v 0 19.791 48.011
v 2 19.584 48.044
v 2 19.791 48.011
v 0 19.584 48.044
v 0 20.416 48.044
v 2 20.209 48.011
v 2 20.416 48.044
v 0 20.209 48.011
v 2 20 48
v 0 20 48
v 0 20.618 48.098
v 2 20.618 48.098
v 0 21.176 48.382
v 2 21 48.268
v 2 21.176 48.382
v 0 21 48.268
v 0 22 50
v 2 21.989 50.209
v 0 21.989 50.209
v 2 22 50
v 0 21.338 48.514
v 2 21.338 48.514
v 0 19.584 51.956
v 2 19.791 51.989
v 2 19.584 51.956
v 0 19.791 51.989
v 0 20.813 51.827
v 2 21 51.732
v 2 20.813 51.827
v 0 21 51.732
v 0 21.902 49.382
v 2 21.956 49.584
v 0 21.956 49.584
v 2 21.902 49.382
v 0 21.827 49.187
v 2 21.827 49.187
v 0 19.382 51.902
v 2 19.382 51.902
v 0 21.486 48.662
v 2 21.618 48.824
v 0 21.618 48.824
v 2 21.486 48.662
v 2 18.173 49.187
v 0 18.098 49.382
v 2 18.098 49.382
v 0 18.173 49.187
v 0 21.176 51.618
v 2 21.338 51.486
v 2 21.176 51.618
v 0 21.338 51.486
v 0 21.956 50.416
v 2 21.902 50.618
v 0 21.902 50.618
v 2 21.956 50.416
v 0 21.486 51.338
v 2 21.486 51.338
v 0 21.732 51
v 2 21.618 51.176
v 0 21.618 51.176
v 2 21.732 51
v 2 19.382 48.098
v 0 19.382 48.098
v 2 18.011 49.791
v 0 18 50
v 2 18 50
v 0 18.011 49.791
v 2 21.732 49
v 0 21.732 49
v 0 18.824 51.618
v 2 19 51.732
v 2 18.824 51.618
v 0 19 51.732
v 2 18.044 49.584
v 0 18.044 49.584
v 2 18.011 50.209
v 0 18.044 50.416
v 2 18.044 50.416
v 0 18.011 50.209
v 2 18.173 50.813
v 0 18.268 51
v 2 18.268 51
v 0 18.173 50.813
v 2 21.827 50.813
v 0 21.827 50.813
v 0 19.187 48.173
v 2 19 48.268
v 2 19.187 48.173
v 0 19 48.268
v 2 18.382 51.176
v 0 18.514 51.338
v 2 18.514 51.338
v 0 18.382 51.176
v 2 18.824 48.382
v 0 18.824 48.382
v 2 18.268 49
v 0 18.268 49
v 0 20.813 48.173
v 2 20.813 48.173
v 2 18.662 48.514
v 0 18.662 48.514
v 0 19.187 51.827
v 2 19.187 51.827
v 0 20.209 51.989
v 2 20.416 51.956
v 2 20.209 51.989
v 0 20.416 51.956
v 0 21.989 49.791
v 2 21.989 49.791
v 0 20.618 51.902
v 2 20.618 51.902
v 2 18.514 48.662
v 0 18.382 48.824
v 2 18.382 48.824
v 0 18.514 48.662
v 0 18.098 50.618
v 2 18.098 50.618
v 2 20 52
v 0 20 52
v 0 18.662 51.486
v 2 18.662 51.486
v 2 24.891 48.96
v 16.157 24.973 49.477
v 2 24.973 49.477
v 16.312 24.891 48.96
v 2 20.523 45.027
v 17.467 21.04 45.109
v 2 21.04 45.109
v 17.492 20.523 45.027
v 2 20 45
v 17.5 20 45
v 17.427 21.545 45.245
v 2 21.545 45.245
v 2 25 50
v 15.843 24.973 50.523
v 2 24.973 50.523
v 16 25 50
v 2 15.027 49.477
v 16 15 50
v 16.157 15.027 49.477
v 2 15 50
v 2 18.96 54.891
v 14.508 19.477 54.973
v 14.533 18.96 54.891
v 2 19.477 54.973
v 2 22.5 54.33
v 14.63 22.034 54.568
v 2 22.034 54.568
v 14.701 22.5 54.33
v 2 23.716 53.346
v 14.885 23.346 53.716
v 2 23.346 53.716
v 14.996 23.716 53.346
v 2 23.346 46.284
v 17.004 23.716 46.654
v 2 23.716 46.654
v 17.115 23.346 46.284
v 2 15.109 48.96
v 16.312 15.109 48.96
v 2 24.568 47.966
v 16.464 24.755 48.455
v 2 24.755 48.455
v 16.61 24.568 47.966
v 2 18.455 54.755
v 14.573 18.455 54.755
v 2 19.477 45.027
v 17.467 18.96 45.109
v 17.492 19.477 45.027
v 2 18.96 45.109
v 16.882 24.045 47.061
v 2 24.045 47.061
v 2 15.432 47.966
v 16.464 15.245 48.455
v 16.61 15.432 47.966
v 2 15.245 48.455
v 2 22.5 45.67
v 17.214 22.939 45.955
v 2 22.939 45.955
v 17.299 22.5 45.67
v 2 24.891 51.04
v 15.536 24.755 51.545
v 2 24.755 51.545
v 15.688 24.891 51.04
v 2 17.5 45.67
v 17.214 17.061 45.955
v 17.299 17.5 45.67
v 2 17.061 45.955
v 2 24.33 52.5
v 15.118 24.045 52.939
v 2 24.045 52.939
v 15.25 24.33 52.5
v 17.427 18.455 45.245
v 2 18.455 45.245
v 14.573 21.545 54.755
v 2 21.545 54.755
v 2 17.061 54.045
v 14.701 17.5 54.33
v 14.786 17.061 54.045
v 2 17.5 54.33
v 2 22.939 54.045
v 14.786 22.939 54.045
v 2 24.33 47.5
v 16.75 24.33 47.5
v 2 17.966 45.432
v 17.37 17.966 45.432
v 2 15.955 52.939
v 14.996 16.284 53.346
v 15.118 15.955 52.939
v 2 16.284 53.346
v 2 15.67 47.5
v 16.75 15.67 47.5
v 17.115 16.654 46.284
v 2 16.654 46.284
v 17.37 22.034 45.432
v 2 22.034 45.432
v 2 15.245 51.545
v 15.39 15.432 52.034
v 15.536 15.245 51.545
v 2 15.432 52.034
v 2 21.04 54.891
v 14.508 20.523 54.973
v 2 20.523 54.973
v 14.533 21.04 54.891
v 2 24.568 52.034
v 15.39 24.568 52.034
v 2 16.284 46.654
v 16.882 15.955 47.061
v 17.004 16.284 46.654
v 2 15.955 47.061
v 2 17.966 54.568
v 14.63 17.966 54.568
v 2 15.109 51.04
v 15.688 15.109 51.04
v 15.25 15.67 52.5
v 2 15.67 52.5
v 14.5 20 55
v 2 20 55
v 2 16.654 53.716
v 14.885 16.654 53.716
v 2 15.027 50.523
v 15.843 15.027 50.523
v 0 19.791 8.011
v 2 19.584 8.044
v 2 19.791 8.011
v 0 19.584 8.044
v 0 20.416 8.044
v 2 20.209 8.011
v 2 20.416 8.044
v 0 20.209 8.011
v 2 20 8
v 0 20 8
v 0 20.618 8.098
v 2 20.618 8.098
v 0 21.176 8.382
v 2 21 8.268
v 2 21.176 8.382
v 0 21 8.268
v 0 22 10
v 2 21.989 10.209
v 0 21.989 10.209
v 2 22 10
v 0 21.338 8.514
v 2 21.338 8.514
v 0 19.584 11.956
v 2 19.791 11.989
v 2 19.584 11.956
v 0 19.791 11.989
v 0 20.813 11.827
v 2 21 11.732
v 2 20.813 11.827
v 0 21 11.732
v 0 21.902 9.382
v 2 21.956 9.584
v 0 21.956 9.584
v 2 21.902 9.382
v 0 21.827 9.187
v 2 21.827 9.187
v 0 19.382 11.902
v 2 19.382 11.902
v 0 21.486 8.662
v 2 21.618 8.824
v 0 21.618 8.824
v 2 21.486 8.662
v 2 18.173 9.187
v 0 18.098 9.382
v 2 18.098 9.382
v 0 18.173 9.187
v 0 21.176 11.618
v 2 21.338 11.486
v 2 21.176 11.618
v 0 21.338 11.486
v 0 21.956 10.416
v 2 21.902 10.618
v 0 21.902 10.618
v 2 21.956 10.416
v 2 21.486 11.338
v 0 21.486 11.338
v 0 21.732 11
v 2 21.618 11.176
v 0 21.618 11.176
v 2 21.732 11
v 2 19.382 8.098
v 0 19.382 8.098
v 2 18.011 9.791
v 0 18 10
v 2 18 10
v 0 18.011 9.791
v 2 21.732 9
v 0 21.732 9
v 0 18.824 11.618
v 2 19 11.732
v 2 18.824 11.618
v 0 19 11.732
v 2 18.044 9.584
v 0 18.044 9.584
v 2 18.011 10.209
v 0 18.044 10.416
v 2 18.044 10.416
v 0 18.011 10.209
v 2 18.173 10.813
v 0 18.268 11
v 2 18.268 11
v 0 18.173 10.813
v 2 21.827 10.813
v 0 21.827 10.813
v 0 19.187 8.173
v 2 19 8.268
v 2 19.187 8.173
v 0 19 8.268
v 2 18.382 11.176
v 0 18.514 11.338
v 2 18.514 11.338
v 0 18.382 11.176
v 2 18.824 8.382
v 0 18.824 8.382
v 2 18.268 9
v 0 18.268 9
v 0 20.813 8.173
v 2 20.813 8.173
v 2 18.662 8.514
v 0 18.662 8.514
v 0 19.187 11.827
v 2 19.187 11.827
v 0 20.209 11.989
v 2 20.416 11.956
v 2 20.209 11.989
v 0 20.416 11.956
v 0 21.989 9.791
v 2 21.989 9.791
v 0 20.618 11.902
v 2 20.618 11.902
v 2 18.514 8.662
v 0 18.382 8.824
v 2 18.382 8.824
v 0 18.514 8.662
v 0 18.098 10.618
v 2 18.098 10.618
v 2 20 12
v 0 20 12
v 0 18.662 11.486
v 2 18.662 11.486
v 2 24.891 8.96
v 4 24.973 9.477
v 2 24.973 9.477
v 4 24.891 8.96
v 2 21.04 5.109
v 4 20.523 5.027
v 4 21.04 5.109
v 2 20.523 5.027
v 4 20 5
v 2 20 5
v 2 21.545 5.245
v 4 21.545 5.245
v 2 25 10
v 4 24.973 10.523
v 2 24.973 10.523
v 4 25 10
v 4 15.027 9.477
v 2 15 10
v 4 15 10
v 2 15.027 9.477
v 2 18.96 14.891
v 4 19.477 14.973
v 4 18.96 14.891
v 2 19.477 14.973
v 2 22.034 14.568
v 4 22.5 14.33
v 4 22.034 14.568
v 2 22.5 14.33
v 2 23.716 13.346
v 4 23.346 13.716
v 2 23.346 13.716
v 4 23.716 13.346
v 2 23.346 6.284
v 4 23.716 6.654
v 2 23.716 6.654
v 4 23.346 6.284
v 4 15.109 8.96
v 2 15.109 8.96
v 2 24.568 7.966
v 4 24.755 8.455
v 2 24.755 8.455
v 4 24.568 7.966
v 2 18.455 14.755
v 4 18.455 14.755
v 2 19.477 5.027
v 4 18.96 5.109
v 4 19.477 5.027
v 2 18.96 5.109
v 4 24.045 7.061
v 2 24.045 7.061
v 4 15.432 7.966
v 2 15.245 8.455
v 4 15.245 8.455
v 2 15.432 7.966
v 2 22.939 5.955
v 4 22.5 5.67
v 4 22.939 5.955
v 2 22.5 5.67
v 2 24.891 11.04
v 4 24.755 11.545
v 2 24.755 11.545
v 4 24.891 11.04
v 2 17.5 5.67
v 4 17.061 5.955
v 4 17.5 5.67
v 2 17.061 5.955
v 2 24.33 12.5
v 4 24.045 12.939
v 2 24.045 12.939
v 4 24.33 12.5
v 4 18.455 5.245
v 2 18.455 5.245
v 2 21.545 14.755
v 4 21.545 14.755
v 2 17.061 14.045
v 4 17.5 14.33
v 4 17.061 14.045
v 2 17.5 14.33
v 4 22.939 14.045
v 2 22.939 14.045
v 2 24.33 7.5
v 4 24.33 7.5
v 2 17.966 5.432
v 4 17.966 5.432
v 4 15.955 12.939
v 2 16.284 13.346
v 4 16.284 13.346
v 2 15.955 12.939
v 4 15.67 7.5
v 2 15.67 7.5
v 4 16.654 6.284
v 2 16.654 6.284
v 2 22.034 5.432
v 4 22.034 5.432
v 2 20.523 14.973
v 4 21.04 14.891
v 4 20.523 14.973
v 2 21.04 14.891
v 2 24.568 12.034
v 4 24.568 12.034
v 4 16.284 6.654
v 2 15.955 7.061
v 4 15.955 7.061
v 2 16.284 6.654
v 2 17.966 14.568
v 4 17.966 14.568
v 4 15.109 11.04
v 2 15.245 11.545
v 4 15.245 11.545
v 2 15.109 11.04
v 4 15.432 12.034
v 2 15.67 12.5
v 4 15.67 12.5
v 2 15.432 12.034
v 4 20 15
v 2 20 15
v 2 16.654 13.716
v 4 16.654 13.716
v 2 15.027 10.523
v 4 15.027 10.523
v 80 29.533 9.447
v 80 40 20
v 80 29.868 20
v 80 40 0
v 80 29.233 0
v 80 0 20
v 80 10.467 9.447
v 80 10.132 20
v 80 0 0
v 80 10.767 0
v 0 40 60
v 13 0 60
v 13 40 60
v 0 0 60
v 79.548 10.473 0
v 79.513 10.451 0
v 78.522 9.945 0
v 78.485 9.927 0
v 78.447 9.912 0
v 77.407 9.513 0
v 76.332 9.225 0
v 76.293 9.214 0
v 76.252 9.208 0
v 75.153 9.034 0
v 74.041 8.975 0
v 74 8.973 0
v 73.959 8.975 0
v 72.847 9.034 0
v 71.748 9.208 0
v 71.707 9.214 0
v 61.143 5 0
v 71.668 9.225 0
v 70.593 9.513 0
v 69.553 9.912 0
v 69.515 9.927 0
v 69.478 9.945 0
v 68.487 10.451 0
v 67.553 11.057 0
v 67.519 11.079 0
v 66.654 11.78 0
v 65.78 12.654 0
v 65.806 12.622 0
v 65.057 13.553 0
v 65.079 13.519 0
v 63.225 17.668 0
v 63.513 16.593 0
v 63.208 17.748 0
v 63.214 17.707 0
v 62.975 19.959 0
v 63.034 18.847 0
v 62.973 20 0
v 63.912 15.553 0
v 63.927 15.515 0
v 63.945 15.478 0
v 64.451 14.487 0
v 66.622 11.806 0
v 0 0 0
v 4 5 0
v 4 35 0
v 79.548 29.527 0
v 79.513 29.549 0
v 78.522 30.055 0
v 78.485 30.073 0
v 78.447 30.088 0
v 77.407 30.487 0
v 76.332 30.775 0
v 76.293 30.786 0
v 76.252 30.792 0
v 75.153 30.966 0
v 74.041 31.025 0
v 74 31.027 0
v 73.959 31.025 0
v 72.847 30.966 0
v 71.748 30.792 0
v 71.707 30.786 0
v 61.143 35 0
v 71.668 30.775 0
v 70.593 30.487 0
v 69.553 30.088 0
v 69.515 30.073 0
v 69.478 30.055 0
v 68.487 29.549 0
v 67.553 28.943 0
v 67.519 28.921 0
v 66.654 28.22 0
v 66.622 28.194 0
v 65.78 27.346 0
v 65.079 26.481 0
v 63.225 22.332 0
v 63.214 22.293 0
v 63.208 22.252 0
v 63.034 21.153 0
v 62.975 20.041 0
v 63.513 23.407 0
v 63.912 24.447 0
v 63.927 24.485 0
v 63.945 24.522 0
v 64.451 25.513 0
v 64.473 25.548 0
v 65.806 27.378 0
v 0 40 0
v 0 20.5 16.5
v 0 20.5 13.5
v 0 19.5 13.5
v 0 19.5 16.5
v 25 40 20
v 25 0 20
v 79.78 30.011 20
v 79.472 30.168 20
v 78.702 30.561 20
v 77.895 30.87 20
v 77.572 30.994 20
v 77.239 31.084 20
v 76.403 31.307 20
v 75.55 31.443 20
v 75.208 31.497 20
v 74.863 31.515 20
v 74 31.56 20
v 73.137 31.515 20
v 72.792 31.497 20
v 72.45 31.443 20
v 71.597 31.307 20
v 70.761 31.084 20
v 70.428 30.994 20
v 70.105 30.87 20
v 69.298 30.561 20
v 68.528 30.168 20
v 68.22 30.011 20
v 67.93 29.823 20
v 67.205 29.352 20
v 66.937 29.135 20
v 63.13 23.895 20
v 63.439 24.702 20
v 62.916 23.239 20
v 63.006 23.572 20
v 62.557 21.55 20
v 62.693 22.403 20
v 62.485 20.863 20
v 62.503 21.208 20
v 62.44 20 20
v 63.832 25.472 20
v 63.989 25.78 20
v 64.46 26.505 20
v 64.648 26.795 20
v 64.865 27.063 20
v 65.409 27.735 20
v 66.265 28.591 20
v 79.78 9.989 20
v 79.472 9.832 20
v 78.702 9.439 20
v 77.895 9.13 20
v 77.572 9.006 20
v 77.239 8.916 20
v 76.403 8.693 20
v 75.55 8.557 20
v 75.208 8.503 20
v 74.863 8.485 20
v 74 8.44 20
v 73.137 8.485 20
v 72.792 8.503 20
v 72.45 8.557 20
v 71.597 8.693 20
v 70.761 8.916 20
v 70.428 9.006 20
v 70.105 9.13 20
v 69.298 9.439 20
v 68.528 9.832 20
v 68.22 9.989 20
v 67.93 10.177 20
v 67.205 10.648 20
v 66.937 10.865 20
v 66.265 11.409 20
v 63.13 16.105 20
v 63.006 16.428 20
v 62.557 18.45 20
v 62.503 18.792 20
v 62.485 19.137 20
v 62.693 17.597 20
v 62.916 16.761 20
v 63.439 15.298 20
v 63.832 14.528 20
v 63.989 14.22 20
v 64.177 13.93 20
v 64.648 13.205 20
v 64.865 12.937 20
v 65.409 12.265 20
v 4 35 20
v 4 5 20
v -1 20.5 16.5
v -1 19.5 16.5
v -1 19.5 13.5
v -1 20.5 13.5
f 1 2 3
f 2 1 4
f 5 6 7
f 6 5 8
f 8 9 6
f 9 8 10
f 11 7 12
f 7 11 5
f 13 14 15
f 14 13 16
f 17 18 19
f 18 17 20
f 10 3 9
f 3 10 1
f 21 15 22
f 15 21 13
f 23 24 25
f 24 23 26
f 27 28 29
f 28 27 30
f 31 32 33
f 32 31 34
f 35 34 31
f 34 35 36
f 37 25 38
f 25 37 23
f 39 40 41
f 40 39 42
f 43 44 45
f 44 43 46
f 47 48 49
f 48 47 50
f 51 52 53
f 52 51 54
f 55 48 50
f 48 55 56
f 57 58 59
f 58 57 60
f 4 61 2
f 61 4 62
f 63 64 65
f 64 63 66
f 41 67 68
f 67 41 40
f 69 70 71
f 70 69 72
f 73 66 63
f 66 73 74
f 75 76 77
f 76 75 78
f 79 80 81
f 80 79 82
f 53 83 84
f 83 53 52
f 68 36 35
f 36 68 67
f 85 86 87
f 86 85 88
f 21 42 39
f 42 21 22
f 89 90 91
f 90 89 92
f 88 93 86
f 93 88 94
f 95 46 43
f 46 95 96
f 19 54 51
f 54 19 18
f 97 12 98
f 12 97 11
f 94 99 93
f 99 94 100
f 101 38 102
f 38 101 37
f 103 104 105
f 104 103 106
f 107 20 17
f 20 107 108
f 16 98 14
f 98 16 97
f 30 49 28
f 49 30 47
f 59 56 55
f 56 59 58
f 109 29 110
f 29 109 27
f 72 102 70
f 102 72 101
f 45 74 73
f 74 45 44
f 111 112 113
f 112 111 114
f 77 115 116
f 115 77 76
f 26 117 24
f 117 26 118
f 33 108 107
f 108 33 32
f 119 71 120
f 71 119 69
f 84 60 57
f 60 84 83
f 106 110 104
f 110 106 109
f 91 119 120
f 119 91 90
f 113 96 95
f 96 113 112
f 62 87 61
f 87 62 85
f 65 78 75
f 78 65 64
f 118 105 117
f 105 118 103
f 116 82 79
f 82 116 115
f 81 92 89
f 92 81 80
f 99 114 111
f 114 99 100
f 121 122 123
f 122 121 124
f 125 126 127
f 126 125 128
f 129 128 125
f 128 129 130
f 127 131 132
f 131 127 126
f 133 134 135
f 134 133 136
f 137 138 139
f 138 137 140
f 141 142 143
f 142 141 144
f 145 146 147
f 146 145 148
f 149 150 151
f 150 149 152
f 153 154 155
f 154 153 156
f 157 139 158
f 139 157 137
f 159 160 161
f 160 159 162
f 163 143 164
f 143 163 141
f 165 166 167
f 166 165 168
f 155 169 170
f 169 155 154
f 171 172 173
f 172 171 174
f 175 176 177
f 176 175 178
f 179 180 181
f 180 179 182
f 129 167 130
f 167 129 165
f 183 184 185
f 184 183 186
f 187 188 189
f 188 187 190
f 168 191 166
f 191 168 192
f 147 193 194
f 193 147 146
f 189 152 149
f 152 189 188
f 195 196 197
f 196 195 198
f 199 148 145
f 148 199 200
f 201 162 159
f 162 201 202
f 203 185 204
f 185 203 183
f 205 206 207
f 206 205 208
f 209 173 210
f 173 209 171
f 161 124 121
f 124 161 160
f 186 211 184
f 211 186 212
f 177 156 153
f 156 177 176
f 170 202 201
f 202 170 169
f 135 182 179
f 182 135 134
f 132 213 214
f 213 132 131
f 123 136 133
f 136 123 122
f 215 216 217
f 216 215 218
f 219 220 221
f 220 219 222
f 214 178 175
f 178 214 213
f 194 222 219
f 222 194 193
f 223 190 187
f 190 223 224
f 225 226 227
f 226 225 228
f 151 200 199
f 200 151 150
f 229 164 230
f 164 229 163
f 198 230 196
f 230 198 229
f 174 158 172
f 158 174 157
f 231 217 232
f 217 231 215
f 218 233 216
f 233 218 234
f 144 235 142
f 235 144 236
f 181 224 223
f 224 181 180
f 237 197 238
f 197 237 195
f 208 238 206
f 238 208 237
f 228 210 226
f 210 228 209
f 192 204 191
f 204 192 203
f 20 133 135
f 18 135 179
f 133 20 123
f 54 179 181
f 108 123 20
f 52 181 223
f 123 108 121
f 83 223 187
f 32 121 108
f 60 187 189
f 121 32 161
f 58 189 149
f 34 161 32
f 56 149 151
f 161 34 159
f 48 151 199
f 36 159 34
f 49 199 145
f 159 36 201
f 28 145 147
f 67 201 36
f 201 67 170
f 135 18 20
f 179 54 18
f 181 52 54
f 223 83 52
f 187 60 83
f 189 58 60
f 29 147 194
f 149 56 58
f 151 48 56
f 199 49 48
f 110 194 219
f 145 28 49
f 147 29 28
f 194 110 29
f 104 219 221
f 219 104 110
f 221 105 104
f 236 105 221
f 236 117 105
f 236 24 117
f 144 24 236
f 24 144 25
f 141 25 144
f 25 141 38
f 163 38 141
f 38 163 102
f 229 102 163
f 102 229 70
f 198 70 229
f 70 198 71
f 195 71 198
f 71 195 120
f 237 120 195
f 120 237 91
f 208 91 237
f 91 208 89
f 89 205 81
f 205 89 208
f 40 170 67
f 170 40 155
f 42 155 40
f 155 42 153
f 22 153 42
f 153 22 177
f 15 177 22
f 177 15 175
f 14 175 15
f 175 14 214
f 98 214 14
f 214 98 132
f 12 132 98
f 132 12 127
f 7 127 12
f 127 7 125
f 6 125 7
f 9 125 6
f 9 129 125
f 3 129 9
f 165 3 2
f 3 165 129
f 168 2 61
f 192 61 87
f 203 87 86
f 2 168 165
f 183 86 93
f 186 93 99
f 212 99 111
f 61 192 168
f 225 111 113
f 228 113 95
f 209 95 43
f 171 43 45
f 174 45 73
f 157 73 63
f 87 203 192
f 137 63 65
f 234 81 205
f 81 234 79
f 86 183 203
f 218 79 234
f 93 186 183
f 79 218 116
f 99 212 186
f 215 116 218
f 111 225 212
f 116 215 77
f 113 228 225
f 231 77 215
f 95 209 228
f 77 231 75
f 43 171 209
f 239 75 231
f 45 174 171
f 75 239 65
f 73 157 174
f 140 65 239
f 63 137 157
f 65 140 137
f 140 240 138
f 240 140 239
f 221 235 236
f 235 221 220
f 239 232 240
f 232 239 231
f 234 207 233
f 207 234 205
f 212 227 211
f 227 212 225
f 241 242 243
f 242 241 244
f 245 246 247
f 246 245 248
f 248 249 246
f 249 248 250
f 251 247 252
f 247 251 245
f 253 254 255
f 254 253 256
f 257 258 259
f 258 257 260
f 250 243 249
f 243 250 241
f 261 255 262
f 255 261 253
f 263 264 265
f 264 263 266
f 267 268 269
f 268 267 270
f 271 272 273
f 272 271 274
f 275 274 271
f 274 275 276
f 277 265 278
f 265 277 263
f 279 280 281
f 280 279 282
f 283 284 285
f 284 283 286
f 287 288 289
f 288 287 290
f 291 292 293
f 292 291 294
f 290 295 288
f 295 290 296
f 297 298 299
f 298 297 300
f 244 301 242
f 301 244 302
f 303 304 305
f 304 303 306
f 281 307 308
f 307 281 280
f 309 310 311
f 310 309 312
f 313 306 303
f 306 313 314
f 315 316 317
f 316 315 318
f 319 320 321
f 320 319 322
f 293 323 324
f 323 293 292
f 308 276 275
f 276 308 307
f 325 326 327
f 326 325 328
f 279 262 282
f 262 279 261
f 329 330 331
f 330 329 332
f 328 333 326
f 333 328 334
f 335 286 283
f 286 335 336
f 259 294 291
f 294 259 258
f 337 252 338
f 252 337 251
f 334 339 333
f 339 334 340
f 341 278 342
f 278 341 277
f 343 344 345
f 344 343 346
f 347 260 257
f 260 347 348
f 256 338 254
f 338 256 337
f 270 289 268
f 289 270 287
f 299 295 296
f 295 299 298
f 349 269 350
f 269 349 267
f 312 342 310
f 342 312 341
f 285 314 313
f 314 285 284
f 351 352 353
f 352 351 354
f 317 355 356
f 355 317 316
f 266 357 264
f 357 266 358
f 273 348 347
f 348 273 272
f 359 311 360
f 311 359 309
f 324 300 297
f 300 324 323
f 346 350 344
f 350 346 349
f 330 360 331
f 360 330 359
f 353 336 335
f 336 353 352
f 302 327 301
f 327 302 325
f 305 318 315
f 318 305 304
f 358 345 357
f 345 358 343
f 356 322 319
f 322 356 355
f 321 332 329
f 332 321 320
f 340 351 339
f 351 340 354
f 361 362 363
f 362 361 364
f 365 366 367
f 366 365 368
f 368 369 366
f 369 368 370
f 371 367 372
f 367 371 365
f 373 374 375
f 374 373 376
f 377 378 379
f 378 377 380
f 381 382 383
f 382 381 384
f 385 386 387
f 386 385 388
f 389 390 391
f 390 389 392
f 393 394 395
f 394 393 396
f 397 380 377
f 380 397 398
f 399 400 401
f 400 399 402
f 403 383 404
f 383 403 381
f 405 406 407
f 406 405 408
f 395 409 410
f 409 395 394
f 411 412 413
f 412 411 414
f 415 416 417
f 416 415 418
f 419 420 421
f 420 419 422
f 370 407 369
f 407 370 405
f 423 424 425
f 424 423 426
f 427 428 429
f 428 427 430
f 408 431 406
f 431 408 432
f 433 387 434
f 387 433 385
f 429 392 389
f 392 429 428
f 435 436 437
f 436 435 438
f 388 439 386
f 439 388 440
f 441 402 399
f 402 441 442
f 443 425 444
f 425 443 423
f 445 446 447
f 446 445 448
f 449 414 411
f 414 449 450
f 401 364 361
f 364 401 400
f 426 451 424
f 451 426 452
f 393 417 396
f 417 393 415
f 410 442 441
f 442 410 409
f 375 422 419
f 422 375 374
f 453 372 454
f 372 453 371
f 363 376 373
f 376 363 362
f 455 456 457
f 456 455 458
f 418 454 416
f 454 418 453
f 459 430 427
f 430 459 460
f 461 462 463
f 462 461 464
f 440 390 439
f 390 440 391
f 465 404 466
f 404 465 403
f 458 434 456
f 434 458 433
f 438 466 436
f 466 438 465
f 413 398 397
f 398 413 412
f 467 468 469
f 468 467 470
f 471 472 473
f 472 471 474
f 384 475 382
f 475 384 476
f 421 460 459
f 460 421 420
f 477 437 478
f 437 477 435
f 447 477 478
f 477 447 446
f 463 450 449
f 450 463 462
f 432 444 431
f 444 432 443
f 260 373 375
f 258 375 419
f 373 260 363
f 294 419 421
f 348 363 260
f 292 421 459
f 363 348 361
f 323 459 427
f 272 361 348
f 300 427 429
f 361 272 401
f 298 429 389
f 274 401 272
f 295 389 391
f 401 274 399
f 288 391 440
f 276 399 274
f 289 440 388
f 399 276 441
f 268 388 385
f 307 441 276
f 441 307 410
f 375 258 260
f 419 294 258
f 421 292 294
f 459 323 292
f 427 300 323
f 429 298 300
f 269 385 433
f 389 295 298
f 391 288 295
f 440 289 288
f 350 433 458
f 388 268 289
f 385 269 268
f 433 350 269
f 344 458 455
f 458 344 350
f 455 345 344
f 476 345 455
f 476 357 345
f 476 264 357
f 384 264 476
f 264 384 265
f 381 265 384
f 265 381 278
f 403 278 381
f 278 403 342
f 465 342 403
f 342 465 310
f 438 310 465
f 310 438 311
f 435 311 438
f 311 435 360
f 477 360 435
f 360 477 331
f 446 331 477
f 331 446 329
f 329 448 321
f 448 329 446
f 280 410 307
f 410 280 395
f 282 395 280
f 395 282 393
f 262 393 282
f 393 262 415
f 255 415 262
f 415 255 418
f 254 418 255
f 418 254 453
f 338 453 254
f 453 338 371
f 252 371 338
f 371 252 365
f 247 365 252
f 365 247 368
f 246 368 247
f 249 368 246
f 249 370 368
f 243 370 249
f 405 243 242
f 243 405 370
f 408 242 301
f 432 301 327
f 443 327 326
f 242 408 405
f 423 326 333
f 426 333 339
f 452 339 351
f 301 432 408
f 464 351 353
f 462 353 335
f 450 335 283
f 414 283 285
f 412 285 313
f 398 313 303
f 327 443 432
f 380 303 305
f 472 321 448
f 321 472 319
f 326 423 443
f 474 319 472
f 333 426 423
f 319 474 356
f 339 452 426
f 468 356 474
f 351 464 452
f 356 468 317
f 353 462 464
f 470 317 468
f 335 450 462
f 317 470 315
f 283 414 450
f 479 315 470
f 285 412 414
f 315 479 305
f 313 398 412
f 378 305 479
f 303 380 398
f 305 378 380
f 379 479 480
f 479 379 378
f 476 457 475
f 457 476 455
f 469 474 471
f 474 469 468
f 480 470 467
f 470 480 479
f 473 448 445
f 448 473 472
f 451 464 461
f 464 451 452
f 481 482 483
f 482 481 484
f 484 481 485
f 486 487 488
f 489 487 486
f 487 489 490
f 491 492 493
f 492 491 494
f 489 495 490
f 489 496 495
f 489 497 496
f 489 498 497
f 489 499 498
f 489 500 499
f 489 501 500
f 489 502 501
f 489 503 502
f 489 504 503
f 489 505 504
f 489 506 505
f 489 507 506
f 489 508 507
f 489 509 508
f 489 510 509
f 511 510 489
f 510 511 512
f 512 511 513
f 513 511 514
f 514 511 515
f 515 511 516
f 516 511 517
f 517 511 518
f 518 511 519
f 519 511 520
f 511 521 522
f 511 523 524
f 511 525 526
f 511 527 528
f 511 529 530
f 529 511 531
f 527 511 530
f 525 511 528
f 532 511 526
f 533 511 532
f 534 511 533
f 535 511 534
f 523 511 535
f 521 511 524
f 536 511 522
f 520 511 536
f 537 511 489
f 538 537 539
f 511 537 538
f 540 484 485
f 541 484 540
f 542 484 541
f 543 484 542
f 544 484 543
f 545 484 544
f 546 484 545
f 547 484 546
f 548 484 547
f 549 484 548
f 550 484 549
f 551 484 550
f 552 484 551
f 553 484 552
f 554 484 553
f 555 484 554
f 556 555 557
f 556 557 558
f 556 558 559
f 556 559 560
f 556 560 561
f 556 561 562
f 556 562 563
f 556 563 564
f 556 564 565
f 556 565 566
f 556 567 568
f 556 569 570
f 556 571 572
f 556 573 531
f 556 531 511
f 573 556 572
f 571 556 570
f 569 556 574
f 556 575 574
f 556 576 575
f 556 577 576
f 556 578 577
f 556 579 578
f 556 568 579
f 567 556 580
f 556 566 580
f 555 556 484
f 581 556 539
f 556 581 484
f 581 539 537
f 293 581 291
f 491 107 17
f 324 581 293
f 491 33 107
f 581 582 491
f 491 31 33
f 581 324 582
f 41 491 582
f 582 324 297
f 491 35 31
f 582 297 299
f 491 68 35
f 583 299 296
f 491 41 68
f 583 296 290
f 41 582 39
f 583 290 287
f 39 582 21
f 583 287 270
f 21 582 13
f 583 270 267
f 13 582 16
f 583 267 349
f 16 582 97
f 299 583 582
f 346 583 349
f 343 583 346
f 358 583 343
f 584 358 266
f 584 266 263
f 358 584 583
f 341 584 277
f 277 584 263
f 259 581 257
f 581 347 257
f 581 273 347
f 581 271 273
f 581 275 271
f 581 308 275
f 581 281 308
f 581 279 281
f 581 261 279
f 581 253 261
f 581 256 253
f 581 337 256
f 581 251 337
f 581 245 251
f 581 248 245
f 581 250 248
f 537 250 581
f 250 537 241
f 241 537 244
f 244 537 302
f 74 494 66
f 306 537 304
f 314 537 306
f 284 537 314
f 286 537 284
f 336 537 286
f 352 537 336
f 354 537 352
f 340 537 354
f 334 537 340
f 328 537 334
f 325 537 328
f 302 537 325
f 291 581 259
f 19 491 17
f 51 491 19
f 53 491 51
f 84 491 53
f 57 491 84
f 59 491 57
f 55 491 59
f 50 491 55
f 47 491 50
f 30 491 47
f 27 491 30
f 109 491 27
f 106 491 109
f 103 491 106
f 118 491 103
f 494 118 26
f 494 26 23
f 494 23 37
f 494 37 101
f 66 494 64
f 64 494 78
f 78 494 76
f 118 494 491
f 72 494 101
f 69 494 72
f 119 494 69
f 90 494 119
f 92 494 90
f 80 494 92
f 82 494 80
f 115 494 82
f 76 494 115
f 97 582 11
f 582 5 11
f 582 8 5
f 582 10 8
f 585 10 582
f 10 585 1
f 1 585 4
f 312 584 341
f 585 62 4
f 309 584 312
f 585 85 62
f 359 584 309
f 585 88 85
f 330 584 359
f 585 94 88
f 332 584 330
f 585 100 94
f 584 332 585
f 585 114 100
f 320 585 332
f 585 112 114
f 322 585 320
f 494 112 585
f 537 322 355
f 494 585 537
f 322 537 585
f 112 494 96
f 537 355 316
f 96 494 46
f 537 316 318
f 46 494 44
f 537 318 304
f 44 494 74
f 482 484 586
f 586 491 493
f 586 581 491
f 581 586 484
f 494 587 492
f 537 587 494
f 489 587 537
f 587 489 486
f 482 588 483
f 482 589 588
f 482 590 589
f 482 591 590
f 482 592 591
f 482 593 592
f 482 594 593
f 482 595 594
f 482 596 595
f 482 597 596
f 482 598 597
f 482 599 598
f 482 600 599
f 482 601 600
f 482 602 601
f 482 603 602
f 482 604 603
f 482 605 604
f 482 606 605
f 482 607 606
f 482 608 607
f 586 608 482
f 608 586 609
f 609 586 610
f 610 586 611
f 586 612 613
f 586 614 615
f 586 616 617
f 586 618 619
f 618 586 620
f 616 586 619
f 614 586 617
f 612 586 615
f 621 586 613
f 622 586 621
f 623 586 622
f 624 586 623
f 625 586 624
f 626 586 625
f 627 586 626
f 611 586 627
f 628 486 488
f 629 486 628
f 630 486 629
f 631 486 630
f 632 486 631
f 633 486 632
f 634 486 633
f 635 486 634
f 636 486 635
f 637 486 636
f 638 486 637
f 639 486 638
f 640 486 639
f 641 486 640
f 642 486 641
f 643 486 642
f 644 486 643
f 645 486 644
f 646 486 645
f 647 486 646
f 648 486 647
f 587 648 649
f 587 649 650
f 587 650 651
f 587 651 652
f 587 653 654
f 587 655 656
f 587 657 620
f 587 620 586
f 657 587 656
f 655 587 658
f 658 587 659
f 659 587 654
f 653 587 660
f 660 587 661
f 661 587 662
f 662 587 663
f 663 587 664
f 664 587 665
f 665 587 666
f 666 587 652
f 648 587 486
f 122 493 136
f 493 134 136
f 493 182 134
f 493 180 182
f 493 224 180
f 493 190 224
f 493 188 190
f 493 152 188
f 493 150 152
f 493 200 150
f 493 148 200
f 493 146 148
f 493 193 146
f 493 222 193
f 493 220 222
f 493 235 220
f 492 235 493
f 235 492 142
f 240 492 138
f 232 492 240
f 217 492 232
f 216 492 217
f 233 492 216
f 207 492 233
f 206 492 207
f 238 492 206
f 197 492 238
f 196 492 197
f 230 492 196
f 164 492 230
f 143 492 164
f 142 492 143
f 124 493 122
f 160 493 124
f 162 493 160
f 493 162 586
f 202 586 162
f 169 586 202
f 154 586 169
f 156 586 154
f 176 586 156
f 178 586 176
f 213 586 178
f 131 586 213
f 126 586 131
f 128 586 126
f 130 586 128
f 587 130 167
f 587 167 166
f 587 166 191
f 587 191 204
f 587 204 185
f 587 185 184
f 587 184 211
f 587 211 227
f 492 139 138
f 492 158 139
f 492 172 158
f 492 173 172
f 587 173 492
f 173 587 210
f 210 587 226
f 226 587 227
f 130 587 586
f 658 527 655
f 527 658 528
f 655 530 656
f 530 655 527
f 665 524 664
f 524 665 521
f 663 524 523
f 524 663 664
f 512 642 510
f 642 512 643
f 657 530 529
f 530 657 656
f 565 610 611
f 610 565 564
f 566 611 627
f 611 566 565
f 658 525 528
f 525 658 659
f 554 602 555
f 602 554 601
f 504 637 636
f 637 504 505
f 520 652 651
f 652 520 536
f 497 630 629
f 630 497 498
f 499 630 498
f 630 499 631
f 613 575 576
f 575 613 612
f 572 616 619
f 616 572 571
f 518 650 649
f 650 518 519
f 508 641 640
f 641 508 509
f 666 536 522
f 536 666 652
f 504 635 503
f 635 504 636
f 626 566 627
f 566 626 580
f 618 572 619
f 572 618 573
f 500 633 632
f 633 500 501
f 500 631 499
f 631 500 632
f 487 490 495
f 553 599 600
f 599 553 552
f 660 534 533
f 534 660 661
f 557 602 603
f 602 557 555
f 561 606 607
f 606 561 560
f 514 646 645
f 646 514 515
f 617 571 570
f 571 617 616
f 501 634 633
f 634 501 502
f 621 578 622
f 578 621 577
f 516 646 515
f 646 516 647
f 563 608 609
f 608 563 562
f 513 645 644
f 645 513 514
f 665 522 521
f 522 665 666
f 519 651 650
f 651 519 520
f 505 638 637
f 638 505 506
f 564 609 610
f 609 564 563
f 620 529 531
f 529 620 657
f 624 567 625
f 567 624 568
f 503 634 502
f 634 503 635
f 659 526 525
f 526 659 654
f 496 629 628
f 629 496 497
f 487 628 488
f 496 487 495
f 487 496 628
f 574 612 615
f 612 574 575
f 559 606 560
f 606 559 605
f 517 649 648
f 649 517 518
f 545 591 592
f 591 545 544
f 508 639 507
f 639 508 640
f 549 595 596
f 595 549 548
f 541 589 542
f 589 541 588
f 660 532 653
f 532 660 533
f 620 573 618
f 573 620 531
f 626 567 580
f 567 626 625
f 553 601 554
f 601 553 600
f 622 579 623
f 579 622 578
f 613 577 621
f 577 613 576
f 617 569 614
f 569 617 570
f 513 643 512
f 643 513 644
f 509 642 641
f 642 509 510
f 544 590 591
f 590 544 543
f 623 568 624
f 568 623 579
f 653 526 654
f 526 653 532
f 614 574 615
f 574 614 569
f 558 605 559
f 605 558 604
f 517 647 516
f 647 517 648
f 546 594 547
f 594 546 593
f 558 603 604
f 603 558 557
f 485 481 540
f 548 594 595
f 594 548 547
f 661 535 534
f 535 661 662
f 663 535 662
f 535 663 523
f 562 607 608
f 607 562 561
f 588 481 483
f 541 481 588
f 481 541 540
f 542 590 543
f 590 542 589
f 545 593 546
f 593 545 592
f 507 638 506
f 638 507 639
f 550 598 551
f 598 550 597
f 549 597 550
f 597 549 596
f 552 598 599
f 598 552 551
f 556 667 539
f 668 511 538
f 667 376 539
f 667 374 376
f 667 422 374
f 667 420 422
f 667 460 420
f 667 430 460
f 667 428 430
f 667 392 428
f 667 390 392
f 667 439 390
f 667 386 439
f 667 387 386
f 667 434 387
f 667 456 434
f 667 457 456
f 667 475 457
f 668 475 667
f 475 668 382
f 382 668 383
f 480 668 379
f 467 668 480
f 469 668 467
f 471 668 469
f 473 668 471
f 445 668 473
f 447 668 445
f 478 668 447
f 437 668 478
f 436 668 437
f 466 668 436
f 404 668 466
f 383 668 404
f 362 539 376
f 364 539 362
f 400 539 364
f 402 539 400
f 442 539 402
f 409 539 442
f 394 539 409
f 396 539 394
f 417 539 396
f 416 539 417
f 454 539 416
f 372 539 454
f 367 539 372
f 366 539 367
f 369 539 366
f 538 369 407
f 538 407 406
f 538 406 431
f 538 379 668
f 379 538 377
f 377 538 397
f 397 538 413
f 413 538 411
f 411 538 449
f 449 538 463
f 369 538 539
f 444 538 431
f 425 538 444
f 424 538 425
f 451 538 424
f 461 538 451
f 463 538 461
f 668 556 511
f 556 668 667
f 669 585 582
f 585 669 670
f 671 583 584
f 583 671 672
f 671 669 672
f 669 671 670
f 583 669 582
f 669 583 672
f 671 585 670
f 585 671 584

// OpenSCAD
//count of fragments for cylinders etc.
$fn=60; 
//length, min. 70mm
length=80; 

//holder diameters - slightly larger than the counterpart of the showerhead
SHDia1=22; 
SHDia2=23.6; //

difference() {
    cube([length,40,60]);
    //Neckline above - Ausschnitt oben
    translate([10,45,70]){
        rotate([90,90,0]) {
            linear_extrude(height = 50, center = false, convexity = 10, twist = 0)
            polygon(points=[[0,0],[50,15],[50,length],[0,length]]);
        }
    }
    
    //Holder hole (slightly larger than the part of the showerhead)
    translate([length-6,20,-1])
    cylinder(30,d1=SHDia1,d2=SHDia2);
    
    //hole screw
    translate([14,20,50]) {
        rotate([0,90,0]) {
        cylinder(30,2,2,center=true);
        cylinder(24,5,5,center=true);
        }
    }
    //hole screw below
    translate([9,20,10]) {
        rotate([0,90,0]) {
        cylinder(20,2,2,center=true);
        cylinder(14,5,5,center=true);
        }
    }
    //wedge cut below
    translate([4,20,20]){
        rotate([90,90,0]) {
            linear_extrude(height = 30, center = true, convexity = 10, twist = 0)
            polygon(points=[[0,0],[21,0],[21,60]]);
        }
    }
}

//some fixation - Fugennocke (damit wir nur eine Schraube brauchen - fixiert den Halter etwas in der Fuge der Bad-Plättli - 1mm darf schon sein...)
translate([-0.5,20,15])
cube([1,1,3],center=true);

/* for checking dimensions - Mass zum Abschätzen der vorderen Öffnung - darf etwas kleiner wie 20mm sein (auskommentieren)
translate([length+1,10,0])
cube([7,20,7]);
//*/
